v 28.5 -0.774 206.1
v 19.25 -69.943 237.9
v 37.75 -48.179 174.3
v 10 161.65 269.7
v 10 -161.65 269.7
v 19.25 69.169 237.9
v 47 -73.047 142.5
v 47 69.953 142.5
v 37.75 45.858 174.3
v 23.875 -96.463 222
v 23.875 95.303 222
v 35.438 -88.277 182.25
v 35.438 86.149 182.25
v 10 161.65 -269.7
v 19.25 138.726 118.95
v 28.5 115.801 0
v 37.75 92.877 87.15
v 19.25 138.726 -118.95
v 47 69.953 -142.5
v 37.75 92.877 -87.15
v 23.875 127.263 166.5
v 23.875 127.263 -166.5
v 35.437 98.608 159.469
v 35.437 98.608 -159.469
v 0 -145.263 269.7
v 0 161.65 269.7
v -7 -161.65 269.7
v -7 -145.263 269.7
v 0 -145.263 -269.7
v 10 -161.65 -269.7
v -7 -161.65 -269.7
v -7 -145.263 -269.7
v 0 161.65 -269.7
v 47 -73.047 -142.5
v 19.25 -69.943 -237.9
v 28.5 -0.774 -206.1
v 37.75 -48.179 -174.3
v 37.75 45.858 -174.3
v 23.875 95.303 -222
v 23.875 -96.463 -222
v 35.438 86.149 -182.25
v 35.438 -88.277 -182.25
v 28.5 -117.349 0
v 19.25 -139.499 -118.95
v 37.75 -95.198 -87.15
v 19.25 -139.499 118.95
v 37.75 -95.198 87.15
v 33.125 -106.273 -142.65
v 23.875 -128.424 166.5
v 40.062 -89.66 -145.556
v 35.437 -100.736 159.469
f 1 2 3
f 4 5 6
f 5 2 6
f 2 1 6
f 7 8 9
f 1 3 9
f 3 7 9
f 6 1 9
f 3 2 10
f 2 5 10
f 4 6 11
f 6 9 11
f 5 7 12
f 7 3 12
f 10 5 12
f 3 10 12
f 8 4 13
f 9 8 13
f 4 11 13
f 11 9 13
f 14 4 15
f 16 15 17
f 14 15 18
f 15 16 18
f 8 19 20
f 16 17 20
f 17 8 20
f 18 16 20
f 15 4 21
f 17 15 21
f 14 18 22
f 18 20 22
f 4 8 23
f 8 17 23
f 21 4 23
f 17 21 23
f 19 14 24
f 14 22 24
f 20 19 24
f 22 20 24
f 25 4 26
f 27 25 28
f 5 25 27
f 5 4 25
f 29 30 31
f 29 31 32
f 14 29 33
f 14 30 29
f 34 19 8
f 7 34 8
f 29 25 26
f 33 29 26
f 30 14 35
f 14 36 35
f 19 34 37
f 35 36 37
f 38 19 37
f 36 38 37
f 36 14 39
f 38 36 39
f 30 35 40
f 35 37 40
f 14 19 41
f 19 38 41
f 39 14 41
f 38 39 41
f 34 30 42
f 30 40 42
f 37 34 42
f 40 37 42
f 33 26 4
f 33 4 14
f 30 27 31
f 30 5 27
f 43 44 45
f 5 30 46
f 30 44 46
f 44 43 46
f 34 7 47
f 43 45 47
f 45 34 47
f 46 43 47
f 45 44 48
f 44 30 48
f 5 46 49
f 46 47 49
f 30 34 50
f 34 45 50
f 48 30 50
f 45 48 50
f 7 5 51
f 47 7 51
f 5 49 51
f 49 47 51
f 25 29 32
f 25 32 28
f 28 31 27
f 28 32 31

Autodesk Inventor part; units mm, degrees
ref_plane "YZ Plane" through (0, 0, 0) normal (1, 0, 0) x (0, 1, 0)
ref_plane "XZ Plane" through (0, 0, 0) normal (0, 1, 0) x (-1, 0, 0)
sketch "Sketch1" plane through (0, 0, 0) normal (1, 0, 0) x (0, 1, 0)
  line L0 (-161.65, 269.7) -> (161.65, 269.7)
  line L1 (161.65, 269.7) -> (161.65, -269.7)
  line L2 (161.65, -269.7) -> (-161.65, -269.7)
  line L3 (-161.65, -269.7) -> (-161.65, 269.7)
  line L4 (-161.65, 269.7) -> (161.65, -269.7) construction
  line L5 (161.65, 269.7) -> (-161.65, -269.7) construction
  point P0 (0, 0)
  dimension "d0" = 323.3
  dimension "d1" = 539.4
extrude "Extrusion1" add sketch "Sketch1" along normal blind 10
ref_plane "Work Plane1" through (47, 0, 0) normal (1, 0, 0) x (0, 0, -1)
sketch "Sketch2" plane through (47, 0, 0) normal (1, 0, 0) x (0, 0, -1)
  line L0 (-142.5, 69.9526) -> (142.5, 69.9526)
  line L1 (142.5, 69.9526) -> (142.5, -73.0474)
  line L2 (142.5, -73.0474) -> (-142.5, -73.0474)
  line L3 (-142.5, -73.0474) -> (-142.5, 69.9526)
  line L4 (-142.5, 69.9526) -> (142.5, -73.0474) construction
  line L5 (142.5, 69.9526) -> (-142.5, -73.0474) construction
  point P0 (0, 0)
  point P1 (0, -1.5474)
  dimension "d5" = 285
  dimension "d6" = 143
sketch "Sketch3" plane through (10, 0, 0) normal (1, 0, 0) x (0, 0, -1)
  line L0 (269.7, -161.65) -> (269.7, 161.65) projected
  line L1 (269.7, 161.65) -> (-269.7, 161.65) projected
  line L2 (-269.7, 161.65) -> (-269.7, -161.65) projected
  line L3 (-269.7, -161.65) -> (269.7, -161.65) projected
  point P0 (0, 0)
loft "Loft1" add profiles "Sketch2" section 1 edges at (10, 0, -269.7) (10, 161.65, 0) (10, 0, 269.7) (10, -161.65, 0)
sketch "Sketch4" plane through (0, 0, 0) normal (-1, 0, 0) x (0, 0, 1)
  line L0 (-269.7, -161.65) -> (-269.7, 161.65) projected
  line L1 (269.7, -161.65) -> (-269.7, -161.65) projected
  line L2 (269.7, 161.65) -> (269.7, -161.65) projected
  line L3 (-269.7, 161.65) -> (269.7, 161.65) projected
  line L4 (-269.7, -161.65) -> (-269.7, 161.65) projected
  line L5 (-269.7, -145.2634) -> (269.7, -145.2634)
  point P0 (0, 0)
extrude "Extrusion2" add sketch "Sketch4" along normal blind 7 contours L0 L5 L2 L1
properties part number "PANTALLA" material "Steel, Mild, Welded"
